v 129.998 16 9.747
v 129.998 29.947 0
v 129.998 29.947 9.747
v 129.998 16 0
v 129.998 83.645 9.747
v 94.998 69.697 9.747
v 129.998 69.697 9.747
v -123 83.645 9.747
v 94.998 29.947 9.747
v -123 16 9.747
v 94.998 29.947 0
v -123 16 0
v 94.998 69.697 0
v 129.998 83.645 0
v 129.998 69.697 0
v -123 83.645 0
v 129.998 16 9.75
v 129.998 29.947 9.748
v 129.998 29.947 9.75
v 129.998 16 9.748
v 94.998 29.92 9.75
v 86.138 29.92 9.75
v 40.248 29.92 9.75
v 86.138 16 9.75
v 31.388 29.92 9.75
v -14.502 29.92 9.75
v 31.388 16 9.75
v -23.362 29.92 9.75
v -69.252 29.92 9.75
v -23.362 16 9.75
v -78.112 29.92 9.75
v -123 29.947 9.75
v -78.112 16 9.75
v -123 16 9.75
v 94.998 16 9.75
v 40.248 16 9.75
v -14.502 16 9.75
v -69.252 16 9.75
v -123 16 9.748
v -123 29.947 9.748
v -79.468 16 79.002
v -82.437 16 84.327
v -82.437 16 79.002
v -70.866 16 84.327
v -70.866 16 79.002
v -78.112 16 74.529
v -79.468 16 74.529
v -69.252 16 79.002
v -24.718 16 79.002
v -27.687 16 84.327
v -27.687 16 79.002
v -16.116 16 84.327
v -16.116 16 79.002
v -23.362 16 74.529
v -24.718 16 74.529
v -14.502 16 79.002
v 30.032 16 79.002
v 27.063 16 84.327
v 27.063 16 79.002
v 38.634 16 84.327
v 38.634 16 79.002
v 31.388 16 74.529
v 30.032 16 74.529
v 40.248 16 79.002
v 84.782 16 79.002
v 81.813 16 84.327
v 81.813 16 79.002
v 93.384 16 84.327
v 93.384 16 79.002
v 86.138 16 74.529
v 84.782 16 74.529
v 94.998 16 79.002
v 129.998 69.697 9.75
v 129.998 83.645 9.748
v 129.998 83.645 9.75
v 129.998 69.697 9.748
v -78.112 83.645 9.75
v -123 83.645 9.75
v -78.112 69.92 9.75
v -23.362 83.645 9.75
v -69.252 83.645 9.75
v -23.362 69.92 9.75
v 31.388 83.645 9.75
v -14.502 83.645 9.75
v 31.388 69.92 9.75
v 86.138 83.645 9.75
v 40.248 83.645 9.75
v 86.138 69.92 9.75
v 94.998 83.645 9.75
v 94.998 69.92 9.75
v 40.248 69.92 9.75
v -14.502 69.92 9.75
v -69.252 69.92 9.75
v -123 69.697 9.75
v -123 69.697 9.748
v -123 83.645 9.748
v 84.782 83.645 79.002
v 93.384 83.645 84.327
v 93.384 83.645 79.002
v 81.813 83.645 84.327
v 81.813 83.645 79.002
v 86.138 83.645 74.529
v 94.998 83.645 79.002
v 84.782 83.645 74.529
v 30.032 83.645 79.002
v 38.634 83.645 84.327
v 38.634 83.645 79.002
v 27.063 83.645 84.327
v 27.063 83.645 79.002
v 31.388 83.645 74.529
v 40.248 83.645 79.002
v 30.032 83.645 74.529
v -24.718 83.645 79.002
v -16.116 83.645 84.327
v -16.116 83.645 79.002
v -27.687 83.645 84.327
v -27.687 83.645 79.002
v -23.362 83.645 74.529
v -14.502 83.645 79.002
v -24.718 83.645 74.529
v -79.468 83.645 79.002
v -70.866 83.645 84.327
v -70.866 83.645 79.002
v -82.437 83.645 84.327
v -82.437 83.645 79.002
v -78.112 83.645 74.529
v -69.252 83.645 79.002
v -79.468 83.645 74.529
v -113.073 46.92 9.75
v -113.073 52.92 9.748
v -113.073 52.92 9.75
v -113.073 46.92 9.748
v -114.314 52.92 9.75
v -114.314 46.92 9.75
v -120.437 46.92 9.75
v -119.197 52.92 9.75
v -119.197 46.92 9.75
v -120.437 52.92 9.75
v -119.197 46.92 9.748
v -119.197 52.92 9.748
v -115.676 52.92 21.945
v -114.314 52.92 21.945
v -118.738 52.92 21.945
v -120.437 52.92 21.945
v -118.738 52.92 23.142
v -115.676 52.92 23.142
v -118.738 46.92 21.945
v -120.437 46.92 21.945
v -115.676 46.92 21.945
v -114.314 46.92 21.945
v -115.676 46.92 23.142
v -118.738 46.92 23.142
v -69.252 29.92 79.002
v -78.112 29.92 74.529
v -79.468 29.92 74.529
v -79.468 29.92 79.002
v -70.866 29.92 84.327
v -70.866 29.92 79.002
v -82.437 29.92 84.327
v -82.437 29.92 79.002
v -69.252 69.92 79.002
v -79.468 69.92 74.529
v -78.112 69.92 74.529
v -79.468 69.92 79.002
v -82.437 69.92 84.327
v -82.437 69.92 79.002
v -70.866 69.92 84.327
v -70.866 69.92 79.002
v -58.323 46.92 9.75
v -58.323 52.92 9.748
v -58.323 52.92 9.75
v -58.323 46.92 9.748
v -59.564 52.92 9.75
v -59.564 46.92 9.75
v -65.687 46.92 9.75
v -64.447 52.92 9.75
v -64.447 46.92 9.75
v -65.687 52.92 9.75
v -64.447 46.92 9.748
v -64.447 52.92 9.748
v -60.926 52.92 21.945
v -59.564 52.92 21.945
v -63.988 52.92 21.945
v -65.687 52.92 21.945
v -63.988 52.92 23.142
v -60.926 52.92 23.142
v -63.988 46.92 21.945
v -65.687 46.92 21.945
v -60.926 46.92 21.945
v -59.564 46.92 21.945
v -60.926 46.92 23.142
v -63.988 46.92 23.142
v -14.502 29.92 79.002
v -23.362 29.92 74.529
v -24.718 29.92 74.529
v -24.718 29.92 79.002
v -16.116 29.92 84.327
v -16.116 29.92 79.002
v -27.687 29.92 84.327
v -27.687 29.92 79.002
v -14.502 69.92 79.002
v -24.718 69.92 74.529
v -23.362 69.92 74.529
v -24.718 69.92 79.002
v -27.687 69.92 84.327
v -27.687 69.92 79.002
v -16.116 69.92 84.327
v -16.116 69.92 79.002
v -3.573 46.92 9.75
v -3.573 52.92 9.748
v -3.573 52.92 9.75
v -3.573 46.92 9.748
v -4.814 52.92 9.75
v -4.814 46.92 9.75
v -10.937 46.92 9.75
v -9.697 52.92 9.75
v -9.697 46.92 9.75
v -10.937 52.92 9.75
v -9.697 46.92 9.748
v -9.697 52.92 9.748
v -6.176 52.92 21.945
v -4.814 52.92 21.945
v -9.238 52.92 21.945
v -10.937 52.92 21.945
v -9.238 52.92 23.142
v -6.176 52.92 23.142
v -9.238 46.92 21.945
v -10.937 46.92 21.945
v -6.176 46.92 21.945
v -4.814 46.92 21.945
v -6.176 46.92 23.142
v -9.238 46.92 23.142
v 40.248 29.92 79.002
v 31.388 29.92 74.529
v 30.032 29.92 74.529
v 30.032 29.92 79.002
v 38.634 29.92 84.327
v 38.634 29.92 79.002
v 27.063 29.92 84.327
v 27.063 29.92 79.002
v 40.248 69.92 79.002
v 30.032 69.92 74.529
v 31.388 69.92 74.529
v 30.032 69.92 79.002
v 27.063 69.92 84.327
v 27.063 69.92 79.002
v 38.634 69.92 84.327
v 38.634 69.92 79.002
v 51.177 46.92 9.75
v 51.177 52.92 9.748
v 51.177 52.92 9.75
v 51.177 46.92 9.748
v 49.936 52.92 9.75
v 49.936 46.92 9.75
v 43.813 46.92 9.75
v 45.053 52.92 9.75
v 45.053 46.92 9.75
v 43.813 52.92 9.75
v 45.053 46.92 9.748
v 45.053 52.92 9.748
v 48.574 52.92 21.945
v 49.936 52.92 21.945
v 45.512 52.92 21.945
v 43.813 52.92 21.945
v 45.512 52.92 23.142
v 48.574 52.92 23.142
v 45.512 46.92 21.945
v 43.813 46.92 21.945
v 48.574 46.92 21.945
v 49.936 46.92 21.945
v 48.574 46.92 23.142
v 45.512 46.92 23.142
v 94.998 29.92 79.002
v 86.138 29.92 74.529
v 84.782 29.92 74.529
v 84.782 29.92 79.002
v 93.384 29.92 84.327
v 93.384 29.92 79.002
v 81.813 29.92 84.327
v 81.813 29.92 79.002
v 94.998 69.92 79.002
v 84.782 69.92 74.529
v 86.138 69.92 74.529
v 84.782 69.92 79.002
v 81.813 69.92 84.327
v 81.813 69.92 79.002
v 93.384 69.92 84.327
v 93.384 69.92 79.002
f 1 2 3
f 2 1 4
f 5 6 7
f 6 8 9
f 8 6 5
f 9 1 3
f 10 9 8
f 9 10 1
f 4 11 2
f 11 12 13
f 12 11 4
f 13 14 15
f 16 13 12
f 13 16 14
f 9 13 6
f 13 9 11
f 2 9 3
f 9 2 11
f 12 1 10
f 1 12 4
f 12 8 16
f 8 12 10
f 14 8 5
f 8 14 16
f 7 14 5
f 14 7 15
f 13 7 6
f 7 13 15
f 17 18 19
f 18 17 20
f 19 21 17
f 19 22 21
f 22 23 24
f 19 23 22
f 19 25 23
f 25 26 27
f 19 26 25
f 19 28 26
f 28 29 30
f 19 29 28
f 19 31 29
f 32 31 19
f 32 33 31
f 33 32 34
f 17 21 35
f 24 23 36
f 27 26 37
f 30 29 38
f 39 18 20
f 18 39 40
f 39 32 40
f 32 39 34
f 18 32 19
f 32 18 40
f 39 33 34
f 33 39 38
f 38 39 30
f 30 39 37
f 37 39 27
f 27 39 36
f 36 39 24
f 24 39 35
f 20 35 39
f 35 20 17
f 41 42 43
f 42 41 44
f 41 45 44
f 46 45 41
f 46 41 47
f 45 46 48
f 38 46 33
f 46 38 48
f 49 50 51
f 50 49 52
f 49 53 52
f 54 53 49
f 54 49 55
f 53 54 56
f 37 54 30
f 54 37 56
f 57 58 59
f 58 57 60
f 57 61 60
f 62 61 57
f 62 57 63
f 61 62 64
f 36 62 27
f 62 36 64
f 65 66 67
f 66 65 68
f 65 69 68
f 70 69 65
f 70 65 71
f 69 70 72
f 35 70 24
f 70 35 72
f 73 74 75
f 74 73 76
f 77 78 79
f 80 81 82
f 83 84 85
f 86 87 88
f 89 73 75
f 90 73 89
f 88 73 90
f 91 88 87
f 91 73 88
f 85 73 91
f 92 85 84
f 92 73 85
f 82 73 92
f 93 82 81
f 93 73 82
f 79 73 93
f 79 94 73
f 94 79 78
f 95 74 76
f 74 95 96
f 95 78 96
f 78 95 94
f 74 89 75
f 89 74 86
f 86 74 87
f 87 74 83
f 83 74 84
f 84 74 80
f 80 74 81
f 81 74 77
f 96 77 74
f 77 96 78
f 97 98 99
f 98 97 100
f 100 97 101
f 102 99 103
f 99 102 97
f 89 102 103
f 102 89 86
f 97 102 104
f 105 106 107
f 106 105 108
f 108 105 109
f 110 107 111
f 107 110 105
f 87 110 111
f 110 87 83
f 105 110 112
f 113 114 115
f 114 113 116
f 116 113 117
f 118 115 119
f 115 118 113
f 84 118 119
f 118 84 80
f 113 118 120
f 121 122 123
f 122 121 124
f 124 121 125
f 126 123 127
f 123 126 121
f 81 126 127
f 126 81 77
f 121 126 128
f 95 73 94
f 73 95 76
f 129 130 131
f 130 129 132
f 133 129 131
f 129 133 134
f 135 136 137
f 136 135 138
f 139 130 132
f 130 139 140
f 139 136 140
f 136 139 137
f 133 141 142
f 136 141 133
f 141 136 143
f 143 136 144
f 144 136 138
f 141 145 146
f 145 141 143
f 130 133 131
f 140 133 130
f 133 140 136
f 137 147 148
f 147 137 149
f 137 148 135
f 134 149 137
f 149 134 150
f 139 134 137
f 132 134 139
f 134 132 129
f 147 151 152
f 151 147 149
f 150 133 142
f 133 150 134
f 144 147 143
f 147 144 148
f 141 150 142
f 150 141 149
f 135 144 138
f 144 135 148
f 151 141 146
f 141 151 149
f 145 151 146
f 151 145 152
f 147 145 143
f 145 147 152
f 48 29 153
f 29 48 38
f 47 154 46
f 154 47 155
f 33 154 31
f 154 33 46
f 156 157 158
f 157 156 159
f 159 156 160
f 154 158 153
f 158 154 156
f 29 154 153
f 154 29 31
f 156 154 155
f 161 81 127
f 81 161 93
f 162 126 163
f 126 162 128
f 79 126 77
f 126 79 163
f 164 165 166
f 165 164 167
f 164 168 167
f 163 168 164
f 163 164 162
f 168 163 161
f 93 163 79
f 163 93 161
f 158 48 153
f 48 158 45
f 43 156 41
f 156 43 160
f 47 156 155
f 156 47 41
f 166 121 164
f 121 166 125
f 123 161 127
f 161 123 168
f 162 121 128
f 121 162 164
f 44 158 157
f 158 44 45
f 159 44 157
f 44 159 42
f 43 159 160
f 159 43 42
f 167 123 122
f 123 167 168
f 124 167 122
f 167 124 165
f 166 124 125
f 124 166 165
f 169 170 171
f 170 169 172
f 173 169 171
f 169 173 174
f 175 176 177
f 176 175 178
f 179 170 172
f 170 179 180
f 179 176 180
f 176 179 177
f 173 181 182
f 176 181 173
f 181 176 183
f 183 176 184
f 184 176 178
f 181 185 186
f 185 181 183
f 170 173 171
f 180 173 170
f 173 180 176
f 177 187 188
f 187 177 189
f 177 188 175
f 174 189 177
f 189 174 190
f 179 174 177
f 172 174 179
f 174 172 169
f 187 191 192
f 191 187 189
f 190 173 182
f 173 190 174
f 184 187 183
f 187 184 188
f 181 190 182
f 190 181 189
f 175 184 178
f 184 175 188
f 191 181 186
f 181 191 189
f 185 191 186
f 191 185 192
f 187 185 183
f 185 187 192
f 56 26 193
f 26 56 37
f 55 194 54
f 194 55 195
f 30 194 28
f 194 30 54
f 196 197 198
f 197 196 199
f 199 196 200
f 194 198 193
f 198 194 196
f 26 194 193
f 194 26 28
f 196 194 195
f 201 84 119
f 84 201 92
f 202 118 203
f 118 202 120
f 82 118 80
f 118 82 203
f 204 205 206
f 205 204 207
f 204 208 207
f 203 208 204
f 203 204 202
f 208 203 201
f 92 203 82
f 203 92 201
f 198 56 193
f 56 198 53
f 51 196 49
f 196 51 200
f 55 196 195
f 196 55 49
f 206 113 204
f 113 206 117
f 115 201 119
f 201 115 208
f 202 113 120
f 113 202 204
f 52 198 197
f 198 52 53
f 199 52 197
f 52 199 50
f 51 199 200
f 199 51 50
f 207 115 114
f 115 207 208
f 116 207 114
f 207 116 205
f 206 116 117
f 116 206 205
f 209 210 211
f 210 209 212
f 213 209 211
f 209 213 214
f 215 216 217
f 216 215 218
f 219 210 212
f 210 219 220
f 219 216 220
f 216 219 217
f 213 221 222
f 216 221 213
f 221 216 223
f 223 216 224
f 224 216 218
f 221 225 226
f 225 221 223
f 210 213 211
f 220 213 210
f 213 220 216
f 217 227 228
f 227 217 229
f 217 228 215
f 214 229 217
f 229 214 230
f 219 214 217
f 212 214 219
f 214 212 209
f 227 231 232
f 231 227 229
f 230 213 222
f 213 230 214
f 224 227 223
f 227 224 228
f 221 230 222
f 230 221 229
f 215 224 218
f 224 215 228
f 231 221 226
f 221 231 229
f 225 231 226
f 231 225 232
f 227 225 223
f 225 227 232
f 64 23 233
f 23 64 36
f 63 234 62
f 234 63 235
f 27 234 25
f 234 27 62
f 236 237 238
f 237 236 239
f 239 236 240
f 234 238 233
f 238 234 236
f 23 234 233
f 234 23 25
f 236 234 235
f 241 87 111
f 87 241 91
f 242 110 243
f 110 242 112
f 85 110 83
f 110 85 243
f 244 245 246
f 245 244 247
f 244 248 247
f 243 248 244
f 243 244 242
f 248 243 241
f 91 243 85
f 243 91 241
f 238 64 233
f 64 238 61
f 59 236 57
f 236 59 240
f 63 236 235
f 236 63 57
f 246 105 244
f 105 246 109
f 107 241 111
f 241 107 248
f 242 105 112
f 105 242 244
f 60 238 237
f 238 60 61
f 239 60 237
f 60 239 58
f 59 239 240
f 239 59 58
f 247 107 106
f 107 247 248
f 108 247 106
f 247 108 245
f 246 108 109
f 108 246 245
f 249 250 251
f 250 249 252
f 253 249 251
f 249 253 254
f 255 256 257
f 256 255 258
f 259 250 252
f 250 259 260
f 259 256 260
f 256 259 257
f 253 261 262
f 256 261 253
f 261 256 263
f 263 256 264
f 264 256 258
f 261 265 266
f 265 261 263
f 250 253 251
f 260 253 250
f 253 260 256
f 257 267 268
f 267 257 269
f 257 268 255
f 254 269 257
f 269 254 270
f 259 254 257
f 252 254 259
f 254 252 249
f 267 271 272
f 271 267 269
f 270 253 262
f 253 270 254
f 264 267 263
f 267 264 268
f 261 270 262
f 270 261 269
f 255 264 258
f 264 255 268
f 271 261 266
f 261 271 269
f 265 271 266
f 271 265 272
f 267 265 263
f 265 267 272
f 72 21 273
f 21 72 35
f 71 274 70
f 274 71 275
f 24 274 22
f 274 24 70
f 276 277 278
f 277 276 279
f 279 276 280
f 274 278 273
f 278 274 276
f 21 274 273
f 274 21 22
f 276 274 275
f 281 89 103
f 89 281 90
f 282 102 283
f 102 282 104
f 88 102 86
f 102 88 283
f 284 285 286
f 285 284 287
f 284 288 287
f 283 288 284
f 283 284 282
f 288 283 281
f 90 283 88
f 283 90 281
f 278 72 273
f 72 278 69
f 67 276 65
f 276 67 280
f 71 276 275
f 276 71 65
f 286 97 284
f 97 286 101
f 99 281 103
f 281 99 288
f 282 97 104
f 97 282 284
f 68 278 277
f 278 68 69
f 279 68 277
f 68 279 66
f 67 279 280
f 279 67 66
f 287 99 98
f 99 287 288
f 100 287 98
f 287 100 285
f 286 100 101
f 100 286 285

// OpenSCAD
// Parameterized version of top_rect_cubes_simplified_jay.scad
// Parameters (edit these):
//   width:    overall X width (right side shifts)
//   length:   overall Y depth (scales from front face)
//   arm_gap:  gap in Y between the two arms (overrides the scaled gap)
//
// Knob-centering behavior:
// - Features in the mid-band (the small "knobs" on the large planes) stay centered
//   between the arms when arm_gap changes (they shift by half the gap delta).
//
// Identity check (matches the source geometry exactly) when:
//   width  = 252.997994;
//   length = 59.644998;
//   arm_gap = 31.750000;

width   = 252.997994;
length  = 59.644998;
arm_gap = 39.750000;

// --- Reference constants (from source file) ---
_x_min      = -123.000008;
_x_split    = 94.997986;
_width_orig = 252.997994;

// Y reference landmarks (original)
// front arm ends at _y_front_end, back arm starts at _y_back_start.
// mid-band corresponds to the small "knobs" on the large planes.
_y_min           = 15.999999;
_y_front_end     = 29.946999;
_y_mid_band_start = 42.919998;
_y_mid_band_end   = 48.919998;
_y_back_start    = 61.696999;
_y_max           = 75.644997;
_length_orig     = 59.644998;
_arm_gap_orig    = 31.750000;

// --- Mapping functions ---
// X: shift the right side to hit the desired width
function map_x(x) = (x < _x_split) ? x : (x + (width - _width_orig));

// Y: first scale overall length from the front face, then shift the back-arm region
// to achieve the requested arm_gap. Mid-band features shift by half the gap delta.
function scale_y(y) = _y_min + (y - _y_min) * (length / _length_orig);

function _front_end_s() = scale_y(_y_front_end);
function _back_start_s() = scale_y(_y_back_start);
function _mid_start_s() = scale_y(_y_mid_band_start);
function _mid_end_s()   = scale_y(_y_mid_band_end);

function _gap_scaled() = _back_start_s() - _front_end_s();
function _gap_delta()  = arm_gap - _gap_scaled();

function map_y(y) =
  let(
    y0 = scale_y(y),
    bs = _back_start_s(),
    ms = _mid_start_s(),
    me = _mid_end_s(),
    dg = _gap_delta()
  )
  (y0 < bs)
    ? ((y0 >= ms && y0 <= me) ? (y0 + dg/2) : y0)
    : (y0 + dg);

module rect_prism_m(x1,y1,x2,y2,z0,h){
  translate([map_x(x1), map_y(y1), z0])
    cube([map_x(x2)-map_x(x1), map_y(y2)-map_y(y1), h], center=false);
}


// --- Section controls ---
// Four section templates exist (0..3). Each template is a left-to-right slice of the design
// and contains *two towers* (front + back) plus its mid-band features.
//
// To remove/reorder/repeat sections, edit these:
section_sequence = [0,1,2,3];           // which templates to place in each slot (can repeat)
section_show     = [true,true,true,true]; // per-slot visibility (same length as section_sequence)

_section_centers = [-73.682014, -18.932015, 35.817985, 90.567986];
_section_pitch   = 54.750000;

function slot_center(slot) = _section_centers[0] + slot*_section_pitch;
function template_center(idx) = _section_centers[idx];

module section_by_index(idx) {
  if (idx==0) section_0();
  else if (idx==1) section_1();
  else if (idx==2) section_2();
  else if (idx==3) section_3();
  else assert(false, str("Invalid section index: ", idx));
}

module place_section(slot, idx) {
  // Translate template idx into slot position so spacing stays consistent
  translate([slot_center(slot) - template_center(idx), 0, 0]) section_by_index(idx);
}

module sections() {
  for (slot = [0 : len(section_sequence)-1]) {
    if (slot < len(section_show) && section_show[slot]) {
      place_section(slot, section_sequence[slot]);
    }
  }
}

// --- Base planes (common to all sections) ---
module base_planes() {
  union() {
    rect_prism_m(94.997986,15.999999,129.997986,29.946999,0.000000,9.747);
    rect_prism_m(-123.000008,15.999999,94.997986,75.644997,0.000000,9.747);
    rect_prism_m(94.997986,61.696999,129.997986,75.644997,0.000000,9.747);
    rect_prism_m(-123.000008,15.999999,129.997986,29.946999,9.748000,0.002);
    rect_prism_m(-123.000008,61.696999,129.997986,75.644997,9.748000,0.002);
  }
}

module section_0() {
  union() {
    rect_prism_m(-119.196615,42.919998,-113.073431,48.919998,9.748000,0.002);
    rect_prism_m(-120.437410,42.919998,-114.314075,48.919998,9.750000,12.195);
    rect_prism_m(-118.738005,42.919998,-115.676272,48.919998,21.945000,1.197);
    rect_prism_m(-78.112015,15.999999,-69.252014,29.919998,9.750000,64.779);
    rect_prism_m(-78.112015,61.919998,-69.252014,75.644997,9.750000,64.779);
    rect_prism_m(-79.467536,15.999999,-69.252014,29.919998,74.529000,4.4726);
    rect_prism_m(-79.467536,61.919998,-69.252014,75.644997,74.529000,4.4726);
    rect_prism_m(-82.437039,15.999999,-70.865755,29.919998,79.001600,5.3254);
    rect_prism_m(-82.437039,61.919998,-70.865755,75.644997,79.001600,5.3254);
  }
}

module section_1() {
  union() {
    rect_prism_m(-64.446630,42.919998,-58.323427,48.919998,9.748000,0.002);
    rect_prism_m(-65.687418,42.919998,-59.564071,48.919998,9.750000,12.195);
    rect_prism_m(-63.988003,42.919998,-60.926268,48.919998,21.945000,1.197);
    rect_prism_m(-23.362015,15.999999,-14.502014,29.919998,9.750000,64.779);
    rect_prism_m(-23.362015,61.919998,-14.502014,75.644997,9.750000,64.779);
    rect_prism_m(-24.717536,15.999999,-14.502014,29.919998,74.529000,4.4726);
    rect_prism_m(-24.717536,61.919998,-14.502014,75.644997,74.529000,4.4726);
    rect_prism_m(-27.687036,15.999999,-16.115755,29.919998,79.001600,5.3254);
    rect_prism_m(-27.687036,61.919998,-16.115755,75.644997,79.001600,5.3254);
  }
}

module section_2() {
  union() {
    rect_prism_m(-9.696628,42.919998,-3.573428,48.919998,9.748000,0.002);
    rect_prism_m(-10.937418,42.919998,-4.814072,48.919998,9.750000,12.195);
    rect_prism_m(-9.238005,42.919998,-6.176269,48.919998,21.945000,1.197);
    rect_prism_m(31.387985,15.999999,40.247986,29.919998,9.750000,64.779);
    rect_prism_m(31.387985,61.919998,40.247986,75.644997,9.750000,64.779);
    rect_prism_m(30.032464,15.999999,40.247986,29.919998,74.529000,4.4726);
    rect_prism_m(30.032464,61.919998,40.247986,75.644997,74.529000,4.4726);
    rect_prism_m(27.062964,15.999999,38.634246,29.919998,79.001600,5.3254);
    rect_prism_m(27.062964,61.919998,38.634246,75.644997,79.001600,5.3254);
  }
}

module section_3() {
  union() {
    rect_prism_m(45.053381,42.919998,51.176573,48.919998,9.748000,0.002);
    rect_prism_m(43.812582,42.919998,49.935932,48.919998,9.750000,12.195);
    rect_prism_m(45.511995,42.919998,48.573739,48.919998,21.945000,1.197);
    rect_prism_m(86.137985,15.999999,94.997986,29.919998,9.750000,64.779);
    rect_prism_m(86.137985,61.919998,94.997986,75.644997,9.750000,64.779);
    rect_prism_m(84.782464,15.999999,94.997986,29.919998,74.529000,4.4726);
    rect_prism_m(84.782464,61.919998,94.997986,75.644997,74.529000,4.4726);
    rect_prism_m(81.812961,15.999999,93.384242,29.919998,79.001600,5.3254);
    rect_prism_m(81.812961,61.919998,93.384242,75.644997,79.001600,5.3254);
  }
}

// --- Final assembly ---
module top() {
  union() {
    base_planes();
    sections();
  }
}

top();
